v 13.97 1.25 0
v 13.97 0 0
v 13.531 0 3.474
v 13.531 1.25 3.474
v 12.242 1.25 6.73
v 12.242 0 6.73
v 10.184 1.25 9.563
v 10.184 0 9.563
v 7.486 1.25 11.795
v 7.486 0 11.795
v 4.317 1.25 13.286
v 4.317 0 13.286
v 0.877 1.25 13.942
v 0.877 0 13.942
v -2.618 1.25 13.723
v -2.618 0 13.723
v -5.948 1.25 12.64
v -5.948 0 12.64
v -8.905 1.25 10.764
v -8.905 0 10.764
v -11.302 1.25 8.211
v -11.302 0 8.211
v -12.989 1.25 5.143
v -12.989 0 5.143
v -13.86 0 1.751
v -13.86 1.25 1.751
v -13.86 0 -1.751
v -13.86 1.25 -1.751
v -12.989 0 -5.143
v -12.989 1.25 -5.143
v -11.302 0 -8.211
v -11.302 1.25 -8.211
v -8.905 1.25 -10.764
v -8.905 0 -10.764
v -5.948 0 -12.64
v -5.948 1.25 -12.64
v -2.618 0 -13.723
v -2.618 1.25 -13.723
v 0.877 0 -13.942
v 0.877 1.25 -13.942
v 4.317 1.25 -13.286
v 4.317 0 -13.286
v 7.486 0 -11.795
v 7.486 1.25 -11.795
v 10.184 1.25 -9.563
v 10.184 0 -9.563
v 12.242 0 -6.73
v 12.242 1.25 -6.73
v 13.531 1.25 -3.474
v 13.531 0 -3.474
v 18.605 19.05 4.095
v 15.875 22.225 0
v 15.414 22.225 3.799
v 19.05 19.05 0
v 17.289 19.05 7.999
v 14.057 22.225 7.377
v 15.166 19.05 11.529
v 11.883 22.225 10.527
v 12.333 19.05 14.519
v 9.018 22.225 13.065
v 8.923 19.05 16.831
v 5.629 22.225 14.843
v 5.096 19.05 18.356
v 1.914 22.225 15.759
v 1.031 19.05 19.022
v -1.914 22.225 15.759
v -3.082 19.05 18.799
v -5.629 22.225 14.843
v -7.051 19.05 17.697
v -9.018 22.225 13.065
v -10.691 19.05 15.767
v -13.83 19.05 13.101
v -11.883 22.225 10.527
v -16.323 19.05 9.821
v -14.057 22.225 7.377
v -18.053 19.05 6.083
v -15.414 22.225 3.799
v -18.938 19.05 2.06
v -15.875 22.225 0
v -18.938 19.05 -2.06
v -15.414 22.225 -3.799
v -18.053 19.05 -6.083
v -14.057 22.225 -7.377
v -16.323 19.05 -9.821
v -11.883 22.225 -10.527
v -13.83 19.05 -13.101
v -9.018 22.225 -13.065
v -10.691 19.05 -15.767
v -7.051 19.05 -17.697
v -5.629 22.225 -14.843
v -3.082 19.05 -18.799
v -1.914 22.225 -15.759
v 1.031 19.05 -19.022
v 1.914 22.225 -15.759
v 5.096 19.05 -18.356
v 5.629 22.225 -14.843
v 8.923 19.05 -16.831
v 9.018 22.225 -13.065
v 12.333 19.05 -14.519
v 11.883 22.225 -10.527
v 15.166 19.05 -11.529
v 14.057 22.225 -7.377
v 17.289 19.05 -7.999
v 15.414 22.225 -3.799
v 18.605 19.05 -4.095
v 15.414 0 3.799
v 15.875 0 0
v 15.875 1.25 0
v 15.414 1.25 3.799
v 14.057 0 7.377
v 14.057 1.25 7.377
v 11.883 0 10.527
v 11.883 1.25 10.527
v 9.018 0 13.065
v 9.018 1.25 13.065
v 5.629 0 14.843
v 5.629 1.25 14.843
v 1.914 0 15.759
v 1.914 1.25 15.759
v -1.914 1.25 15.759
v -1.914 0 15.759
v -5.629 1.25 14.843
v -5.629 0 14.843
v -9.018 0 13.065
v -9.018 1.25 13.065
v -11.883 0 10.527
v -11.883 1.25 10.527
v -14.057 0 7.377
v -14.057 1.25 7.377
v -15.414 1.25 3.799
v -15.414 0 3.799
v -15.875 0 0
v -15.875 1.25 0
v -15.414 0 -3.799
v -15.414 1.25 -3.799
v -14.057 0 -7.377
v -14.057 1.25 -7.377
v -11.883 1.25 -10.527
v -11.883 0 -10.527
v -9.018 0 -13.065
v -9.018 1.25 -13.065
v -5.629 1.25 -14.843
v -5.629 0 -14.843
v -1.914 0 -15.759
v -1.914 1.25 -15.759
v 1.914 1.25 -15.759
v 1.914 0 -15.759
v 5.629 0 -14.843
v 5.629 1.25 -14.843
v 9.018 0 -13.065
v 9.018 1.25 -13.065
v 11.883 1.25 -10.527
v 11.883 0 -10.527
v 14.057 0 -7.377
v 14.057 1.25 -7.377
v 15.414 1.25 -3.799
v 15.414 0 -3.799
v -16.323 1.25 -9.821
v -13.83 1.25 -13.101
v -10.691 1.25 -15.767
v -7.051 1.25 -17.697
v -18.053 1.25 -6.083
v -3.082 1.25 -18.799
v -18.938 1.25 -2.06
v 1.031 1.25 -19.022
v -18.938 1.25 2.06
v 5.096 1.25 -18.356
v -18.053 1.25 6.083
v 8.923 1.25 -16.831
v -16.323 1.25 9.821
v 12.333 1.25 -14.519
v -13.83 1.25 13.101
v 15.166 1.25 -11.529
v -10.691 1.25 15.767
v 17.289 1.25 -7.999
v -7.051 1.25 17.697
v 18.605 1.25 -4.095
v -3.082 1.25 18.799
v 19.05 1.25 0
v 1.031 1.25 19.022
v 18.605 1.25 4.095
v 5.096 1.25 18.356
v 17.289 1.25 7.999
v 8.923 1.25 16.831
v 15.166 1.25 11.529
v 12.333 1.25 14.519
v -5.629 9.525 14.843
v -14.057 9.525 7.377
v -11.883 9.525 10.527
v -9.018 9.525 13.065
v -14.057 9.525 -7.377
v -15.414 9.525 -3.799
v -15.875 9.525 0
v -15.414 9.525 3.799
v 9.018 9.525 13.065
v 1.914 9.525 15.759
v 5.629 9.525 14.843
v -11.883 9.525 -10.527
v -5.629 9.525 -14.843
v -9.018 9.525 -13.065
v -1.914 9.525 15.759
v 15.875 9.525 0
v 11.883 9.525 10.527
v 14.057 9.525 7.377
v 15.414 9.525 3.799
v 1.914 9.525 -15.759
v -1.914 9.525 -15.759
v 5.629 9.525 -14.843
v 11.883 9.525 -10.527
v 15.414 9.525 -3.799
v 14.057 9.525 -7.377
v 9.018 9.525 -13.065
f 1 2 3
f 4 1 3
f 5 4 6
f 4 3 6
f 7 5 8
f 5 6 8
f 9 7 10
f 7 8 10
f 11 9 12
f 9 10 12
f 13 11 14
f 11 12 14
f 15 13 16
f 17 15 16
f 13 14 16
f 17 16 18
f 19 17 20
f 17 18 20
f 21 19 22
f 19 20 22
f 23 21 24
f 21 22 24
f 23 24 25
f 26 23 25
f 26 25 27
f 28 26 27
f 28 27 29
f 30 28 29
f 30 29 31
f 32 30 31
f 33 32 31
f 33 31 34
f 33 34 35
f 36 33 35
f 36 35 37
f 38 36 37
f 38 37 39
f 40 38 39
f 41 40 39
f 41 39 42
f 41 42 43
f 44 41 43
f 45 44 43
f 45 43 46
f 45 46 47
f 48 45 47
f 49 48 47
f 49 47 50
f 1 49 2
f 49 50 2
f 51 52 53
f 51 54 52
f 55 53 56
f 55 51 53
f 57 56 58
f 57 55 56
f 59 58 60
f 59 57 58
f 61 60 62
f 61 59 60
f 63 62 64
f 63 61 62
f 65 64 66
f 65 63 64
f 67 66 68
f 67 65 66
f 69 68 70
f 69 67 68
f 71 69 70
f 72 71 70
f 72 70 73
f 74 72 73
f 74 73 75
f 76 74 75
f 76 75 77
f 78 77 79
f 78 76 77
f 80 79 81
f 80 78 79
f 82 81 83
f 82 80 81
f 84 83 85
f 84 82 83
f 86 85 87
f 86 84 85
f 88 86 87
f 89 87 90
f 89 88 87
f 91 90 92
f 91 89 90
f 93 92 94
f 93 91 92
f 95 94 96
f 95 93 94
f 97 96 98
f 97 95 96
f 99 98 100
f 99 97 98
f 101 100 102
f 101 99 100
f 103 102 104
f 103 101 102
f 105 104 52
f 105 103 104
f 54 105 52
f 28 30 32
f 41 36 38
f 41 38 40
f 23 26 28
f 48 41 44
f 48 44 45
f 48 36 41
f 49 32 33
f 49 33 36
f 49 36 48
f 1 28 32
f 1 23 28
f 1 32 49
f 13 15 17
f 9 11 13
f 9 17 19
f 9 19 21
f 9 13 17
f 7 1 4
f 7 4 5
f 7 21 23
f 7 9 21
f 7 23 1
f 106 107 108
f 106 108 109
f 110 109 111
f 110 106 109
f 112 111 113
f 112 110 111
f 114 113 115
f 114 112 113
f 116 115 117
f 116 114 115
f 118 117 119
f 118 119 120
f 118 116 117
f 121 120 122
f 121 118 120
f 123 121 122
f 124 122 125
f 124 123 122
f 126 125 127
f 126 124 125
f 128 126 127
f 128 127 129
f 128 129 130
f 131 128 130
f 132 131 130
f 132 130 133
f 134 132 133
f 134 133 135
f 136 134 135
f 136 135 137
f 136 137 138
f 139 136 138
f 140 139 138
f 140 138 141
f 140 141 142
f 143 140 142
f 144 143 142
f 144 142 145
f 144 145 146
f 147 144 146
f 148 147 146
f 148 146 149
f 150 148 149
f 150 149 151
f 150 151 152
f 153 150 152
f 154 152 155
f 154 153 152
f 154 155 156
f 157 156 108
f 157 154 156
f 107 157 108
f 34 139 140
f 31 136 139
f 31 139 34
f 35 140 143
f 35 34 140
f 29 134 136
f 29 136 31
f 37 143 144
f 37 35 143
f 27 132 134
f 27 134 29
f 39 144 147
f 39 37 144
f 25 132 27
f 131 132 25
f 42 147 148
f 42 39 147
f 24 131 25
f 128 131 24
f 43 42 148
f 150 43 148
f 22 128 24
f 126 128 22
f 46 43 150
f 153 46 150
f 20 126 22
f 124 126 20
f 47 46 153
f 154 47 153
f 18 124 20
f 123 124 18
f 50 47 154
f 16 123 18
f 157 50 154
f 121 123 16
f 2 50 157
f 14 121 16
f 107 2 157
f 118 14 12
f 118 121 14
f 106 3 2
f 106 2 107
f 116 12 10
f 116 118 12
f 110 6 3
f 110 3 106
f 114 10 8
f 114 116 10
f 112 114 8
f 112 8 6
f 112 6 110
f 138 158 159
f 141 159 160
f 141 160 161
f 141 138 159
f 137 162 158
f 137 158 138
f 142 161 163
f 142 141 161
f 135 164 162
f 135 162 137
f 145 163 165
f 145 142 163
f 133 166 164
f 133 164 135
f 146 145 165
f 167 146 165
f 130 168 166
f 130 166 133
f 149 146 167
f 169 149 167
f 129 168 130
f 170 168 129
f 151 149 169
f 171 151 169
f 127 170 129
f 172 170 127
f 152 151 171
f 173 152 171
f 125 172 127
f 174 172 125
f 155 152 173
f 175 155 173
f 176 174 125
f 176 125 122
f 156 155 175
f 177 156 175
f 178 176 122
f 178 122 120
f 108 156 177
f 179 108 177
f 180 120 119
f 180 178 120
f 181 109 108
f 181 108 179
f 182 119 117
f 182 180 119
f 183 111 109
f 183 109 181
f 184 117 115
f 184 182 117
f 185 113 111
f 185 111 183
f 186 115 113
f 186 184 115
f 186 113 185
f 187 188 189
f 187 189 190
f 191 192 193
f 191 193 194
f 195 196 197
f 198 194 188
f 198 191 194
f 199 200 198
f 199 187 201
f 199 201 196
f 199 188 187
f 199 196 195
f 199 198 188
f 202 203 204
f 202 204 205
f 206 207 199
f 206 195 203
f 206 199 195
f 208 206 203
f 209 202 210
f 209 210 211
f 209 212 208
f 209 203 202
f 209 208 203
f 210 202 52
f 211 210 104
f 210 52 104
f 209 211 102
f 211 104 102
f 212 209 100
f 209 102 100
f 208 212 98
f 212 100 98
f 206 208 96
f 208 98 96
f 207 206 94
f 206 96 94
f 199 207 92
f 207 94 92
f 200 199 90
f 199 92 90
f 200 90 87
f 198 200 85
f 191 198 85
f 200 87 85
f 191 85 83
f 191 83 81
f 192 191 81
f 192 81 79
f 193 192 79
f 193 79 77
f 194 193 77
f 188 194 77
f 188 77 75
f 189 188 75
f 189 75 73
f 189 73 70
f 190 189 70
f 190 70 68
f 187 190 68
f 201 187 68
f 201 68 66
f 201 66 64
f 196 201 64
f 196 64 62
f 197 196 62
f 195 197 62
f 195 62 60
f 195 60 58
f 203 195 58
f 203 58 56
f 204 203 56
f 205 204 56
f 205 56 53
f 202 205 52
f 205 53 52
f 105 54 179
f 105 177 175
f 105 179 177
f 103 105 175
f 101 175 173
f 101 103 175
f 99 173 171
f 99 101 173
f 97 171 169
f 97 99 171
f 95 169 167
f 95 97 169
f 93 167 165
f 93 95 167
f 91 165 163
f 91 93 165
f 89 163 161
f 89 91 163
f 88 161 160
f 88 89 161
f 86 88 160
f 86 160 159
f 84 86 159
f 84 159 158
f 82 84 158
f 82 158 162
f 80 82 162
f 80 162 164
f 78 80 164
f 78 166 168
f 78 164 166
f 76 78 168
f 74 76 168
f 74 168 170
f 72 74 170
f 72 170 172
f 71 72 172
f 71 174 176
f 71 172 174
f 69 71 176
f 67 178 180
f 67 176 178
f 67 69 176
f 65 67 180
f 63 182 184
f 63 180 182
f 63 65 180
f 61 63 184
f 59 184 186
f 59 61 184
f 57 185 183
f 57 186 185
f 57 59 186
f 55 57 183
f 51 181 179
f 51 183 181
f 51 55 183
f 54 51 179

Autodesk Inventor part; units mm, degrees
ref_plane "YZ Plane" through (0, 0, 0) normal (1, 0, 0) x (0, 1, 0)
ref_plane "XZ Plane" through (0, 0, 0) normal (0, 1, 0) x (-1, 0, 0)
ref_plane "XY Plane" through (0, 0, 0) normal (0, 0, 1) x (1, 0, 0)
sketch "Sketch2" plane through (0, 0, 0) normal (0, 0, 1) x (1, 0, 0)
  line L0 (0, 0) -> (19.05, 0)
  line L1 (19.05, 0) -> (19.05, 19.05)
  line L2 (19.05, 19.05) -> (15.875, 19.05) construction
  line L3 (15.875, 19.05) -> (15.875, 22.225) construction
  line L4 (15.875, 22.225) -> (19.05, 19.05)
  line L5 (15.875, 22.225) -> (0, 22.225)
  line L6 (0, 22.225) -> (0, 0)
  dimension "d3" = 19.05
  dimension "d4" = 19.05
  dimension "d10" = 3.175
  dimension "d11" = 3.175
revolve "Revolution2" add sketch "Sketch2" angle 360 about axis through (0, 22.225, 0) along (0, -1, 0)
sketch "Sketch4" plane through (0, 22.225, 0) normal (0, 1, 0) x (1, 0, 0)
  circle A0 centre (0, 0) radius 15.875 projected
extrude "Extrusion3" cut sketch "Sketch4" against normal blind 12.7
sketch "Sketch6" plane through (0, 0, 0) normal (0, -1, 0) x (1, 0, 0)
  circle A0 centre (0, 0) radius 15.875
  circle A1 centre (0, 0) radius 13.97
  circle A2 centre (0, 0) radius 19.05 projected
  dimension "d48" = 27.94
extrude "Extrusion5" cut sketch "Sketch6" against normal blind 1.25
properties part number "base_1.0"
